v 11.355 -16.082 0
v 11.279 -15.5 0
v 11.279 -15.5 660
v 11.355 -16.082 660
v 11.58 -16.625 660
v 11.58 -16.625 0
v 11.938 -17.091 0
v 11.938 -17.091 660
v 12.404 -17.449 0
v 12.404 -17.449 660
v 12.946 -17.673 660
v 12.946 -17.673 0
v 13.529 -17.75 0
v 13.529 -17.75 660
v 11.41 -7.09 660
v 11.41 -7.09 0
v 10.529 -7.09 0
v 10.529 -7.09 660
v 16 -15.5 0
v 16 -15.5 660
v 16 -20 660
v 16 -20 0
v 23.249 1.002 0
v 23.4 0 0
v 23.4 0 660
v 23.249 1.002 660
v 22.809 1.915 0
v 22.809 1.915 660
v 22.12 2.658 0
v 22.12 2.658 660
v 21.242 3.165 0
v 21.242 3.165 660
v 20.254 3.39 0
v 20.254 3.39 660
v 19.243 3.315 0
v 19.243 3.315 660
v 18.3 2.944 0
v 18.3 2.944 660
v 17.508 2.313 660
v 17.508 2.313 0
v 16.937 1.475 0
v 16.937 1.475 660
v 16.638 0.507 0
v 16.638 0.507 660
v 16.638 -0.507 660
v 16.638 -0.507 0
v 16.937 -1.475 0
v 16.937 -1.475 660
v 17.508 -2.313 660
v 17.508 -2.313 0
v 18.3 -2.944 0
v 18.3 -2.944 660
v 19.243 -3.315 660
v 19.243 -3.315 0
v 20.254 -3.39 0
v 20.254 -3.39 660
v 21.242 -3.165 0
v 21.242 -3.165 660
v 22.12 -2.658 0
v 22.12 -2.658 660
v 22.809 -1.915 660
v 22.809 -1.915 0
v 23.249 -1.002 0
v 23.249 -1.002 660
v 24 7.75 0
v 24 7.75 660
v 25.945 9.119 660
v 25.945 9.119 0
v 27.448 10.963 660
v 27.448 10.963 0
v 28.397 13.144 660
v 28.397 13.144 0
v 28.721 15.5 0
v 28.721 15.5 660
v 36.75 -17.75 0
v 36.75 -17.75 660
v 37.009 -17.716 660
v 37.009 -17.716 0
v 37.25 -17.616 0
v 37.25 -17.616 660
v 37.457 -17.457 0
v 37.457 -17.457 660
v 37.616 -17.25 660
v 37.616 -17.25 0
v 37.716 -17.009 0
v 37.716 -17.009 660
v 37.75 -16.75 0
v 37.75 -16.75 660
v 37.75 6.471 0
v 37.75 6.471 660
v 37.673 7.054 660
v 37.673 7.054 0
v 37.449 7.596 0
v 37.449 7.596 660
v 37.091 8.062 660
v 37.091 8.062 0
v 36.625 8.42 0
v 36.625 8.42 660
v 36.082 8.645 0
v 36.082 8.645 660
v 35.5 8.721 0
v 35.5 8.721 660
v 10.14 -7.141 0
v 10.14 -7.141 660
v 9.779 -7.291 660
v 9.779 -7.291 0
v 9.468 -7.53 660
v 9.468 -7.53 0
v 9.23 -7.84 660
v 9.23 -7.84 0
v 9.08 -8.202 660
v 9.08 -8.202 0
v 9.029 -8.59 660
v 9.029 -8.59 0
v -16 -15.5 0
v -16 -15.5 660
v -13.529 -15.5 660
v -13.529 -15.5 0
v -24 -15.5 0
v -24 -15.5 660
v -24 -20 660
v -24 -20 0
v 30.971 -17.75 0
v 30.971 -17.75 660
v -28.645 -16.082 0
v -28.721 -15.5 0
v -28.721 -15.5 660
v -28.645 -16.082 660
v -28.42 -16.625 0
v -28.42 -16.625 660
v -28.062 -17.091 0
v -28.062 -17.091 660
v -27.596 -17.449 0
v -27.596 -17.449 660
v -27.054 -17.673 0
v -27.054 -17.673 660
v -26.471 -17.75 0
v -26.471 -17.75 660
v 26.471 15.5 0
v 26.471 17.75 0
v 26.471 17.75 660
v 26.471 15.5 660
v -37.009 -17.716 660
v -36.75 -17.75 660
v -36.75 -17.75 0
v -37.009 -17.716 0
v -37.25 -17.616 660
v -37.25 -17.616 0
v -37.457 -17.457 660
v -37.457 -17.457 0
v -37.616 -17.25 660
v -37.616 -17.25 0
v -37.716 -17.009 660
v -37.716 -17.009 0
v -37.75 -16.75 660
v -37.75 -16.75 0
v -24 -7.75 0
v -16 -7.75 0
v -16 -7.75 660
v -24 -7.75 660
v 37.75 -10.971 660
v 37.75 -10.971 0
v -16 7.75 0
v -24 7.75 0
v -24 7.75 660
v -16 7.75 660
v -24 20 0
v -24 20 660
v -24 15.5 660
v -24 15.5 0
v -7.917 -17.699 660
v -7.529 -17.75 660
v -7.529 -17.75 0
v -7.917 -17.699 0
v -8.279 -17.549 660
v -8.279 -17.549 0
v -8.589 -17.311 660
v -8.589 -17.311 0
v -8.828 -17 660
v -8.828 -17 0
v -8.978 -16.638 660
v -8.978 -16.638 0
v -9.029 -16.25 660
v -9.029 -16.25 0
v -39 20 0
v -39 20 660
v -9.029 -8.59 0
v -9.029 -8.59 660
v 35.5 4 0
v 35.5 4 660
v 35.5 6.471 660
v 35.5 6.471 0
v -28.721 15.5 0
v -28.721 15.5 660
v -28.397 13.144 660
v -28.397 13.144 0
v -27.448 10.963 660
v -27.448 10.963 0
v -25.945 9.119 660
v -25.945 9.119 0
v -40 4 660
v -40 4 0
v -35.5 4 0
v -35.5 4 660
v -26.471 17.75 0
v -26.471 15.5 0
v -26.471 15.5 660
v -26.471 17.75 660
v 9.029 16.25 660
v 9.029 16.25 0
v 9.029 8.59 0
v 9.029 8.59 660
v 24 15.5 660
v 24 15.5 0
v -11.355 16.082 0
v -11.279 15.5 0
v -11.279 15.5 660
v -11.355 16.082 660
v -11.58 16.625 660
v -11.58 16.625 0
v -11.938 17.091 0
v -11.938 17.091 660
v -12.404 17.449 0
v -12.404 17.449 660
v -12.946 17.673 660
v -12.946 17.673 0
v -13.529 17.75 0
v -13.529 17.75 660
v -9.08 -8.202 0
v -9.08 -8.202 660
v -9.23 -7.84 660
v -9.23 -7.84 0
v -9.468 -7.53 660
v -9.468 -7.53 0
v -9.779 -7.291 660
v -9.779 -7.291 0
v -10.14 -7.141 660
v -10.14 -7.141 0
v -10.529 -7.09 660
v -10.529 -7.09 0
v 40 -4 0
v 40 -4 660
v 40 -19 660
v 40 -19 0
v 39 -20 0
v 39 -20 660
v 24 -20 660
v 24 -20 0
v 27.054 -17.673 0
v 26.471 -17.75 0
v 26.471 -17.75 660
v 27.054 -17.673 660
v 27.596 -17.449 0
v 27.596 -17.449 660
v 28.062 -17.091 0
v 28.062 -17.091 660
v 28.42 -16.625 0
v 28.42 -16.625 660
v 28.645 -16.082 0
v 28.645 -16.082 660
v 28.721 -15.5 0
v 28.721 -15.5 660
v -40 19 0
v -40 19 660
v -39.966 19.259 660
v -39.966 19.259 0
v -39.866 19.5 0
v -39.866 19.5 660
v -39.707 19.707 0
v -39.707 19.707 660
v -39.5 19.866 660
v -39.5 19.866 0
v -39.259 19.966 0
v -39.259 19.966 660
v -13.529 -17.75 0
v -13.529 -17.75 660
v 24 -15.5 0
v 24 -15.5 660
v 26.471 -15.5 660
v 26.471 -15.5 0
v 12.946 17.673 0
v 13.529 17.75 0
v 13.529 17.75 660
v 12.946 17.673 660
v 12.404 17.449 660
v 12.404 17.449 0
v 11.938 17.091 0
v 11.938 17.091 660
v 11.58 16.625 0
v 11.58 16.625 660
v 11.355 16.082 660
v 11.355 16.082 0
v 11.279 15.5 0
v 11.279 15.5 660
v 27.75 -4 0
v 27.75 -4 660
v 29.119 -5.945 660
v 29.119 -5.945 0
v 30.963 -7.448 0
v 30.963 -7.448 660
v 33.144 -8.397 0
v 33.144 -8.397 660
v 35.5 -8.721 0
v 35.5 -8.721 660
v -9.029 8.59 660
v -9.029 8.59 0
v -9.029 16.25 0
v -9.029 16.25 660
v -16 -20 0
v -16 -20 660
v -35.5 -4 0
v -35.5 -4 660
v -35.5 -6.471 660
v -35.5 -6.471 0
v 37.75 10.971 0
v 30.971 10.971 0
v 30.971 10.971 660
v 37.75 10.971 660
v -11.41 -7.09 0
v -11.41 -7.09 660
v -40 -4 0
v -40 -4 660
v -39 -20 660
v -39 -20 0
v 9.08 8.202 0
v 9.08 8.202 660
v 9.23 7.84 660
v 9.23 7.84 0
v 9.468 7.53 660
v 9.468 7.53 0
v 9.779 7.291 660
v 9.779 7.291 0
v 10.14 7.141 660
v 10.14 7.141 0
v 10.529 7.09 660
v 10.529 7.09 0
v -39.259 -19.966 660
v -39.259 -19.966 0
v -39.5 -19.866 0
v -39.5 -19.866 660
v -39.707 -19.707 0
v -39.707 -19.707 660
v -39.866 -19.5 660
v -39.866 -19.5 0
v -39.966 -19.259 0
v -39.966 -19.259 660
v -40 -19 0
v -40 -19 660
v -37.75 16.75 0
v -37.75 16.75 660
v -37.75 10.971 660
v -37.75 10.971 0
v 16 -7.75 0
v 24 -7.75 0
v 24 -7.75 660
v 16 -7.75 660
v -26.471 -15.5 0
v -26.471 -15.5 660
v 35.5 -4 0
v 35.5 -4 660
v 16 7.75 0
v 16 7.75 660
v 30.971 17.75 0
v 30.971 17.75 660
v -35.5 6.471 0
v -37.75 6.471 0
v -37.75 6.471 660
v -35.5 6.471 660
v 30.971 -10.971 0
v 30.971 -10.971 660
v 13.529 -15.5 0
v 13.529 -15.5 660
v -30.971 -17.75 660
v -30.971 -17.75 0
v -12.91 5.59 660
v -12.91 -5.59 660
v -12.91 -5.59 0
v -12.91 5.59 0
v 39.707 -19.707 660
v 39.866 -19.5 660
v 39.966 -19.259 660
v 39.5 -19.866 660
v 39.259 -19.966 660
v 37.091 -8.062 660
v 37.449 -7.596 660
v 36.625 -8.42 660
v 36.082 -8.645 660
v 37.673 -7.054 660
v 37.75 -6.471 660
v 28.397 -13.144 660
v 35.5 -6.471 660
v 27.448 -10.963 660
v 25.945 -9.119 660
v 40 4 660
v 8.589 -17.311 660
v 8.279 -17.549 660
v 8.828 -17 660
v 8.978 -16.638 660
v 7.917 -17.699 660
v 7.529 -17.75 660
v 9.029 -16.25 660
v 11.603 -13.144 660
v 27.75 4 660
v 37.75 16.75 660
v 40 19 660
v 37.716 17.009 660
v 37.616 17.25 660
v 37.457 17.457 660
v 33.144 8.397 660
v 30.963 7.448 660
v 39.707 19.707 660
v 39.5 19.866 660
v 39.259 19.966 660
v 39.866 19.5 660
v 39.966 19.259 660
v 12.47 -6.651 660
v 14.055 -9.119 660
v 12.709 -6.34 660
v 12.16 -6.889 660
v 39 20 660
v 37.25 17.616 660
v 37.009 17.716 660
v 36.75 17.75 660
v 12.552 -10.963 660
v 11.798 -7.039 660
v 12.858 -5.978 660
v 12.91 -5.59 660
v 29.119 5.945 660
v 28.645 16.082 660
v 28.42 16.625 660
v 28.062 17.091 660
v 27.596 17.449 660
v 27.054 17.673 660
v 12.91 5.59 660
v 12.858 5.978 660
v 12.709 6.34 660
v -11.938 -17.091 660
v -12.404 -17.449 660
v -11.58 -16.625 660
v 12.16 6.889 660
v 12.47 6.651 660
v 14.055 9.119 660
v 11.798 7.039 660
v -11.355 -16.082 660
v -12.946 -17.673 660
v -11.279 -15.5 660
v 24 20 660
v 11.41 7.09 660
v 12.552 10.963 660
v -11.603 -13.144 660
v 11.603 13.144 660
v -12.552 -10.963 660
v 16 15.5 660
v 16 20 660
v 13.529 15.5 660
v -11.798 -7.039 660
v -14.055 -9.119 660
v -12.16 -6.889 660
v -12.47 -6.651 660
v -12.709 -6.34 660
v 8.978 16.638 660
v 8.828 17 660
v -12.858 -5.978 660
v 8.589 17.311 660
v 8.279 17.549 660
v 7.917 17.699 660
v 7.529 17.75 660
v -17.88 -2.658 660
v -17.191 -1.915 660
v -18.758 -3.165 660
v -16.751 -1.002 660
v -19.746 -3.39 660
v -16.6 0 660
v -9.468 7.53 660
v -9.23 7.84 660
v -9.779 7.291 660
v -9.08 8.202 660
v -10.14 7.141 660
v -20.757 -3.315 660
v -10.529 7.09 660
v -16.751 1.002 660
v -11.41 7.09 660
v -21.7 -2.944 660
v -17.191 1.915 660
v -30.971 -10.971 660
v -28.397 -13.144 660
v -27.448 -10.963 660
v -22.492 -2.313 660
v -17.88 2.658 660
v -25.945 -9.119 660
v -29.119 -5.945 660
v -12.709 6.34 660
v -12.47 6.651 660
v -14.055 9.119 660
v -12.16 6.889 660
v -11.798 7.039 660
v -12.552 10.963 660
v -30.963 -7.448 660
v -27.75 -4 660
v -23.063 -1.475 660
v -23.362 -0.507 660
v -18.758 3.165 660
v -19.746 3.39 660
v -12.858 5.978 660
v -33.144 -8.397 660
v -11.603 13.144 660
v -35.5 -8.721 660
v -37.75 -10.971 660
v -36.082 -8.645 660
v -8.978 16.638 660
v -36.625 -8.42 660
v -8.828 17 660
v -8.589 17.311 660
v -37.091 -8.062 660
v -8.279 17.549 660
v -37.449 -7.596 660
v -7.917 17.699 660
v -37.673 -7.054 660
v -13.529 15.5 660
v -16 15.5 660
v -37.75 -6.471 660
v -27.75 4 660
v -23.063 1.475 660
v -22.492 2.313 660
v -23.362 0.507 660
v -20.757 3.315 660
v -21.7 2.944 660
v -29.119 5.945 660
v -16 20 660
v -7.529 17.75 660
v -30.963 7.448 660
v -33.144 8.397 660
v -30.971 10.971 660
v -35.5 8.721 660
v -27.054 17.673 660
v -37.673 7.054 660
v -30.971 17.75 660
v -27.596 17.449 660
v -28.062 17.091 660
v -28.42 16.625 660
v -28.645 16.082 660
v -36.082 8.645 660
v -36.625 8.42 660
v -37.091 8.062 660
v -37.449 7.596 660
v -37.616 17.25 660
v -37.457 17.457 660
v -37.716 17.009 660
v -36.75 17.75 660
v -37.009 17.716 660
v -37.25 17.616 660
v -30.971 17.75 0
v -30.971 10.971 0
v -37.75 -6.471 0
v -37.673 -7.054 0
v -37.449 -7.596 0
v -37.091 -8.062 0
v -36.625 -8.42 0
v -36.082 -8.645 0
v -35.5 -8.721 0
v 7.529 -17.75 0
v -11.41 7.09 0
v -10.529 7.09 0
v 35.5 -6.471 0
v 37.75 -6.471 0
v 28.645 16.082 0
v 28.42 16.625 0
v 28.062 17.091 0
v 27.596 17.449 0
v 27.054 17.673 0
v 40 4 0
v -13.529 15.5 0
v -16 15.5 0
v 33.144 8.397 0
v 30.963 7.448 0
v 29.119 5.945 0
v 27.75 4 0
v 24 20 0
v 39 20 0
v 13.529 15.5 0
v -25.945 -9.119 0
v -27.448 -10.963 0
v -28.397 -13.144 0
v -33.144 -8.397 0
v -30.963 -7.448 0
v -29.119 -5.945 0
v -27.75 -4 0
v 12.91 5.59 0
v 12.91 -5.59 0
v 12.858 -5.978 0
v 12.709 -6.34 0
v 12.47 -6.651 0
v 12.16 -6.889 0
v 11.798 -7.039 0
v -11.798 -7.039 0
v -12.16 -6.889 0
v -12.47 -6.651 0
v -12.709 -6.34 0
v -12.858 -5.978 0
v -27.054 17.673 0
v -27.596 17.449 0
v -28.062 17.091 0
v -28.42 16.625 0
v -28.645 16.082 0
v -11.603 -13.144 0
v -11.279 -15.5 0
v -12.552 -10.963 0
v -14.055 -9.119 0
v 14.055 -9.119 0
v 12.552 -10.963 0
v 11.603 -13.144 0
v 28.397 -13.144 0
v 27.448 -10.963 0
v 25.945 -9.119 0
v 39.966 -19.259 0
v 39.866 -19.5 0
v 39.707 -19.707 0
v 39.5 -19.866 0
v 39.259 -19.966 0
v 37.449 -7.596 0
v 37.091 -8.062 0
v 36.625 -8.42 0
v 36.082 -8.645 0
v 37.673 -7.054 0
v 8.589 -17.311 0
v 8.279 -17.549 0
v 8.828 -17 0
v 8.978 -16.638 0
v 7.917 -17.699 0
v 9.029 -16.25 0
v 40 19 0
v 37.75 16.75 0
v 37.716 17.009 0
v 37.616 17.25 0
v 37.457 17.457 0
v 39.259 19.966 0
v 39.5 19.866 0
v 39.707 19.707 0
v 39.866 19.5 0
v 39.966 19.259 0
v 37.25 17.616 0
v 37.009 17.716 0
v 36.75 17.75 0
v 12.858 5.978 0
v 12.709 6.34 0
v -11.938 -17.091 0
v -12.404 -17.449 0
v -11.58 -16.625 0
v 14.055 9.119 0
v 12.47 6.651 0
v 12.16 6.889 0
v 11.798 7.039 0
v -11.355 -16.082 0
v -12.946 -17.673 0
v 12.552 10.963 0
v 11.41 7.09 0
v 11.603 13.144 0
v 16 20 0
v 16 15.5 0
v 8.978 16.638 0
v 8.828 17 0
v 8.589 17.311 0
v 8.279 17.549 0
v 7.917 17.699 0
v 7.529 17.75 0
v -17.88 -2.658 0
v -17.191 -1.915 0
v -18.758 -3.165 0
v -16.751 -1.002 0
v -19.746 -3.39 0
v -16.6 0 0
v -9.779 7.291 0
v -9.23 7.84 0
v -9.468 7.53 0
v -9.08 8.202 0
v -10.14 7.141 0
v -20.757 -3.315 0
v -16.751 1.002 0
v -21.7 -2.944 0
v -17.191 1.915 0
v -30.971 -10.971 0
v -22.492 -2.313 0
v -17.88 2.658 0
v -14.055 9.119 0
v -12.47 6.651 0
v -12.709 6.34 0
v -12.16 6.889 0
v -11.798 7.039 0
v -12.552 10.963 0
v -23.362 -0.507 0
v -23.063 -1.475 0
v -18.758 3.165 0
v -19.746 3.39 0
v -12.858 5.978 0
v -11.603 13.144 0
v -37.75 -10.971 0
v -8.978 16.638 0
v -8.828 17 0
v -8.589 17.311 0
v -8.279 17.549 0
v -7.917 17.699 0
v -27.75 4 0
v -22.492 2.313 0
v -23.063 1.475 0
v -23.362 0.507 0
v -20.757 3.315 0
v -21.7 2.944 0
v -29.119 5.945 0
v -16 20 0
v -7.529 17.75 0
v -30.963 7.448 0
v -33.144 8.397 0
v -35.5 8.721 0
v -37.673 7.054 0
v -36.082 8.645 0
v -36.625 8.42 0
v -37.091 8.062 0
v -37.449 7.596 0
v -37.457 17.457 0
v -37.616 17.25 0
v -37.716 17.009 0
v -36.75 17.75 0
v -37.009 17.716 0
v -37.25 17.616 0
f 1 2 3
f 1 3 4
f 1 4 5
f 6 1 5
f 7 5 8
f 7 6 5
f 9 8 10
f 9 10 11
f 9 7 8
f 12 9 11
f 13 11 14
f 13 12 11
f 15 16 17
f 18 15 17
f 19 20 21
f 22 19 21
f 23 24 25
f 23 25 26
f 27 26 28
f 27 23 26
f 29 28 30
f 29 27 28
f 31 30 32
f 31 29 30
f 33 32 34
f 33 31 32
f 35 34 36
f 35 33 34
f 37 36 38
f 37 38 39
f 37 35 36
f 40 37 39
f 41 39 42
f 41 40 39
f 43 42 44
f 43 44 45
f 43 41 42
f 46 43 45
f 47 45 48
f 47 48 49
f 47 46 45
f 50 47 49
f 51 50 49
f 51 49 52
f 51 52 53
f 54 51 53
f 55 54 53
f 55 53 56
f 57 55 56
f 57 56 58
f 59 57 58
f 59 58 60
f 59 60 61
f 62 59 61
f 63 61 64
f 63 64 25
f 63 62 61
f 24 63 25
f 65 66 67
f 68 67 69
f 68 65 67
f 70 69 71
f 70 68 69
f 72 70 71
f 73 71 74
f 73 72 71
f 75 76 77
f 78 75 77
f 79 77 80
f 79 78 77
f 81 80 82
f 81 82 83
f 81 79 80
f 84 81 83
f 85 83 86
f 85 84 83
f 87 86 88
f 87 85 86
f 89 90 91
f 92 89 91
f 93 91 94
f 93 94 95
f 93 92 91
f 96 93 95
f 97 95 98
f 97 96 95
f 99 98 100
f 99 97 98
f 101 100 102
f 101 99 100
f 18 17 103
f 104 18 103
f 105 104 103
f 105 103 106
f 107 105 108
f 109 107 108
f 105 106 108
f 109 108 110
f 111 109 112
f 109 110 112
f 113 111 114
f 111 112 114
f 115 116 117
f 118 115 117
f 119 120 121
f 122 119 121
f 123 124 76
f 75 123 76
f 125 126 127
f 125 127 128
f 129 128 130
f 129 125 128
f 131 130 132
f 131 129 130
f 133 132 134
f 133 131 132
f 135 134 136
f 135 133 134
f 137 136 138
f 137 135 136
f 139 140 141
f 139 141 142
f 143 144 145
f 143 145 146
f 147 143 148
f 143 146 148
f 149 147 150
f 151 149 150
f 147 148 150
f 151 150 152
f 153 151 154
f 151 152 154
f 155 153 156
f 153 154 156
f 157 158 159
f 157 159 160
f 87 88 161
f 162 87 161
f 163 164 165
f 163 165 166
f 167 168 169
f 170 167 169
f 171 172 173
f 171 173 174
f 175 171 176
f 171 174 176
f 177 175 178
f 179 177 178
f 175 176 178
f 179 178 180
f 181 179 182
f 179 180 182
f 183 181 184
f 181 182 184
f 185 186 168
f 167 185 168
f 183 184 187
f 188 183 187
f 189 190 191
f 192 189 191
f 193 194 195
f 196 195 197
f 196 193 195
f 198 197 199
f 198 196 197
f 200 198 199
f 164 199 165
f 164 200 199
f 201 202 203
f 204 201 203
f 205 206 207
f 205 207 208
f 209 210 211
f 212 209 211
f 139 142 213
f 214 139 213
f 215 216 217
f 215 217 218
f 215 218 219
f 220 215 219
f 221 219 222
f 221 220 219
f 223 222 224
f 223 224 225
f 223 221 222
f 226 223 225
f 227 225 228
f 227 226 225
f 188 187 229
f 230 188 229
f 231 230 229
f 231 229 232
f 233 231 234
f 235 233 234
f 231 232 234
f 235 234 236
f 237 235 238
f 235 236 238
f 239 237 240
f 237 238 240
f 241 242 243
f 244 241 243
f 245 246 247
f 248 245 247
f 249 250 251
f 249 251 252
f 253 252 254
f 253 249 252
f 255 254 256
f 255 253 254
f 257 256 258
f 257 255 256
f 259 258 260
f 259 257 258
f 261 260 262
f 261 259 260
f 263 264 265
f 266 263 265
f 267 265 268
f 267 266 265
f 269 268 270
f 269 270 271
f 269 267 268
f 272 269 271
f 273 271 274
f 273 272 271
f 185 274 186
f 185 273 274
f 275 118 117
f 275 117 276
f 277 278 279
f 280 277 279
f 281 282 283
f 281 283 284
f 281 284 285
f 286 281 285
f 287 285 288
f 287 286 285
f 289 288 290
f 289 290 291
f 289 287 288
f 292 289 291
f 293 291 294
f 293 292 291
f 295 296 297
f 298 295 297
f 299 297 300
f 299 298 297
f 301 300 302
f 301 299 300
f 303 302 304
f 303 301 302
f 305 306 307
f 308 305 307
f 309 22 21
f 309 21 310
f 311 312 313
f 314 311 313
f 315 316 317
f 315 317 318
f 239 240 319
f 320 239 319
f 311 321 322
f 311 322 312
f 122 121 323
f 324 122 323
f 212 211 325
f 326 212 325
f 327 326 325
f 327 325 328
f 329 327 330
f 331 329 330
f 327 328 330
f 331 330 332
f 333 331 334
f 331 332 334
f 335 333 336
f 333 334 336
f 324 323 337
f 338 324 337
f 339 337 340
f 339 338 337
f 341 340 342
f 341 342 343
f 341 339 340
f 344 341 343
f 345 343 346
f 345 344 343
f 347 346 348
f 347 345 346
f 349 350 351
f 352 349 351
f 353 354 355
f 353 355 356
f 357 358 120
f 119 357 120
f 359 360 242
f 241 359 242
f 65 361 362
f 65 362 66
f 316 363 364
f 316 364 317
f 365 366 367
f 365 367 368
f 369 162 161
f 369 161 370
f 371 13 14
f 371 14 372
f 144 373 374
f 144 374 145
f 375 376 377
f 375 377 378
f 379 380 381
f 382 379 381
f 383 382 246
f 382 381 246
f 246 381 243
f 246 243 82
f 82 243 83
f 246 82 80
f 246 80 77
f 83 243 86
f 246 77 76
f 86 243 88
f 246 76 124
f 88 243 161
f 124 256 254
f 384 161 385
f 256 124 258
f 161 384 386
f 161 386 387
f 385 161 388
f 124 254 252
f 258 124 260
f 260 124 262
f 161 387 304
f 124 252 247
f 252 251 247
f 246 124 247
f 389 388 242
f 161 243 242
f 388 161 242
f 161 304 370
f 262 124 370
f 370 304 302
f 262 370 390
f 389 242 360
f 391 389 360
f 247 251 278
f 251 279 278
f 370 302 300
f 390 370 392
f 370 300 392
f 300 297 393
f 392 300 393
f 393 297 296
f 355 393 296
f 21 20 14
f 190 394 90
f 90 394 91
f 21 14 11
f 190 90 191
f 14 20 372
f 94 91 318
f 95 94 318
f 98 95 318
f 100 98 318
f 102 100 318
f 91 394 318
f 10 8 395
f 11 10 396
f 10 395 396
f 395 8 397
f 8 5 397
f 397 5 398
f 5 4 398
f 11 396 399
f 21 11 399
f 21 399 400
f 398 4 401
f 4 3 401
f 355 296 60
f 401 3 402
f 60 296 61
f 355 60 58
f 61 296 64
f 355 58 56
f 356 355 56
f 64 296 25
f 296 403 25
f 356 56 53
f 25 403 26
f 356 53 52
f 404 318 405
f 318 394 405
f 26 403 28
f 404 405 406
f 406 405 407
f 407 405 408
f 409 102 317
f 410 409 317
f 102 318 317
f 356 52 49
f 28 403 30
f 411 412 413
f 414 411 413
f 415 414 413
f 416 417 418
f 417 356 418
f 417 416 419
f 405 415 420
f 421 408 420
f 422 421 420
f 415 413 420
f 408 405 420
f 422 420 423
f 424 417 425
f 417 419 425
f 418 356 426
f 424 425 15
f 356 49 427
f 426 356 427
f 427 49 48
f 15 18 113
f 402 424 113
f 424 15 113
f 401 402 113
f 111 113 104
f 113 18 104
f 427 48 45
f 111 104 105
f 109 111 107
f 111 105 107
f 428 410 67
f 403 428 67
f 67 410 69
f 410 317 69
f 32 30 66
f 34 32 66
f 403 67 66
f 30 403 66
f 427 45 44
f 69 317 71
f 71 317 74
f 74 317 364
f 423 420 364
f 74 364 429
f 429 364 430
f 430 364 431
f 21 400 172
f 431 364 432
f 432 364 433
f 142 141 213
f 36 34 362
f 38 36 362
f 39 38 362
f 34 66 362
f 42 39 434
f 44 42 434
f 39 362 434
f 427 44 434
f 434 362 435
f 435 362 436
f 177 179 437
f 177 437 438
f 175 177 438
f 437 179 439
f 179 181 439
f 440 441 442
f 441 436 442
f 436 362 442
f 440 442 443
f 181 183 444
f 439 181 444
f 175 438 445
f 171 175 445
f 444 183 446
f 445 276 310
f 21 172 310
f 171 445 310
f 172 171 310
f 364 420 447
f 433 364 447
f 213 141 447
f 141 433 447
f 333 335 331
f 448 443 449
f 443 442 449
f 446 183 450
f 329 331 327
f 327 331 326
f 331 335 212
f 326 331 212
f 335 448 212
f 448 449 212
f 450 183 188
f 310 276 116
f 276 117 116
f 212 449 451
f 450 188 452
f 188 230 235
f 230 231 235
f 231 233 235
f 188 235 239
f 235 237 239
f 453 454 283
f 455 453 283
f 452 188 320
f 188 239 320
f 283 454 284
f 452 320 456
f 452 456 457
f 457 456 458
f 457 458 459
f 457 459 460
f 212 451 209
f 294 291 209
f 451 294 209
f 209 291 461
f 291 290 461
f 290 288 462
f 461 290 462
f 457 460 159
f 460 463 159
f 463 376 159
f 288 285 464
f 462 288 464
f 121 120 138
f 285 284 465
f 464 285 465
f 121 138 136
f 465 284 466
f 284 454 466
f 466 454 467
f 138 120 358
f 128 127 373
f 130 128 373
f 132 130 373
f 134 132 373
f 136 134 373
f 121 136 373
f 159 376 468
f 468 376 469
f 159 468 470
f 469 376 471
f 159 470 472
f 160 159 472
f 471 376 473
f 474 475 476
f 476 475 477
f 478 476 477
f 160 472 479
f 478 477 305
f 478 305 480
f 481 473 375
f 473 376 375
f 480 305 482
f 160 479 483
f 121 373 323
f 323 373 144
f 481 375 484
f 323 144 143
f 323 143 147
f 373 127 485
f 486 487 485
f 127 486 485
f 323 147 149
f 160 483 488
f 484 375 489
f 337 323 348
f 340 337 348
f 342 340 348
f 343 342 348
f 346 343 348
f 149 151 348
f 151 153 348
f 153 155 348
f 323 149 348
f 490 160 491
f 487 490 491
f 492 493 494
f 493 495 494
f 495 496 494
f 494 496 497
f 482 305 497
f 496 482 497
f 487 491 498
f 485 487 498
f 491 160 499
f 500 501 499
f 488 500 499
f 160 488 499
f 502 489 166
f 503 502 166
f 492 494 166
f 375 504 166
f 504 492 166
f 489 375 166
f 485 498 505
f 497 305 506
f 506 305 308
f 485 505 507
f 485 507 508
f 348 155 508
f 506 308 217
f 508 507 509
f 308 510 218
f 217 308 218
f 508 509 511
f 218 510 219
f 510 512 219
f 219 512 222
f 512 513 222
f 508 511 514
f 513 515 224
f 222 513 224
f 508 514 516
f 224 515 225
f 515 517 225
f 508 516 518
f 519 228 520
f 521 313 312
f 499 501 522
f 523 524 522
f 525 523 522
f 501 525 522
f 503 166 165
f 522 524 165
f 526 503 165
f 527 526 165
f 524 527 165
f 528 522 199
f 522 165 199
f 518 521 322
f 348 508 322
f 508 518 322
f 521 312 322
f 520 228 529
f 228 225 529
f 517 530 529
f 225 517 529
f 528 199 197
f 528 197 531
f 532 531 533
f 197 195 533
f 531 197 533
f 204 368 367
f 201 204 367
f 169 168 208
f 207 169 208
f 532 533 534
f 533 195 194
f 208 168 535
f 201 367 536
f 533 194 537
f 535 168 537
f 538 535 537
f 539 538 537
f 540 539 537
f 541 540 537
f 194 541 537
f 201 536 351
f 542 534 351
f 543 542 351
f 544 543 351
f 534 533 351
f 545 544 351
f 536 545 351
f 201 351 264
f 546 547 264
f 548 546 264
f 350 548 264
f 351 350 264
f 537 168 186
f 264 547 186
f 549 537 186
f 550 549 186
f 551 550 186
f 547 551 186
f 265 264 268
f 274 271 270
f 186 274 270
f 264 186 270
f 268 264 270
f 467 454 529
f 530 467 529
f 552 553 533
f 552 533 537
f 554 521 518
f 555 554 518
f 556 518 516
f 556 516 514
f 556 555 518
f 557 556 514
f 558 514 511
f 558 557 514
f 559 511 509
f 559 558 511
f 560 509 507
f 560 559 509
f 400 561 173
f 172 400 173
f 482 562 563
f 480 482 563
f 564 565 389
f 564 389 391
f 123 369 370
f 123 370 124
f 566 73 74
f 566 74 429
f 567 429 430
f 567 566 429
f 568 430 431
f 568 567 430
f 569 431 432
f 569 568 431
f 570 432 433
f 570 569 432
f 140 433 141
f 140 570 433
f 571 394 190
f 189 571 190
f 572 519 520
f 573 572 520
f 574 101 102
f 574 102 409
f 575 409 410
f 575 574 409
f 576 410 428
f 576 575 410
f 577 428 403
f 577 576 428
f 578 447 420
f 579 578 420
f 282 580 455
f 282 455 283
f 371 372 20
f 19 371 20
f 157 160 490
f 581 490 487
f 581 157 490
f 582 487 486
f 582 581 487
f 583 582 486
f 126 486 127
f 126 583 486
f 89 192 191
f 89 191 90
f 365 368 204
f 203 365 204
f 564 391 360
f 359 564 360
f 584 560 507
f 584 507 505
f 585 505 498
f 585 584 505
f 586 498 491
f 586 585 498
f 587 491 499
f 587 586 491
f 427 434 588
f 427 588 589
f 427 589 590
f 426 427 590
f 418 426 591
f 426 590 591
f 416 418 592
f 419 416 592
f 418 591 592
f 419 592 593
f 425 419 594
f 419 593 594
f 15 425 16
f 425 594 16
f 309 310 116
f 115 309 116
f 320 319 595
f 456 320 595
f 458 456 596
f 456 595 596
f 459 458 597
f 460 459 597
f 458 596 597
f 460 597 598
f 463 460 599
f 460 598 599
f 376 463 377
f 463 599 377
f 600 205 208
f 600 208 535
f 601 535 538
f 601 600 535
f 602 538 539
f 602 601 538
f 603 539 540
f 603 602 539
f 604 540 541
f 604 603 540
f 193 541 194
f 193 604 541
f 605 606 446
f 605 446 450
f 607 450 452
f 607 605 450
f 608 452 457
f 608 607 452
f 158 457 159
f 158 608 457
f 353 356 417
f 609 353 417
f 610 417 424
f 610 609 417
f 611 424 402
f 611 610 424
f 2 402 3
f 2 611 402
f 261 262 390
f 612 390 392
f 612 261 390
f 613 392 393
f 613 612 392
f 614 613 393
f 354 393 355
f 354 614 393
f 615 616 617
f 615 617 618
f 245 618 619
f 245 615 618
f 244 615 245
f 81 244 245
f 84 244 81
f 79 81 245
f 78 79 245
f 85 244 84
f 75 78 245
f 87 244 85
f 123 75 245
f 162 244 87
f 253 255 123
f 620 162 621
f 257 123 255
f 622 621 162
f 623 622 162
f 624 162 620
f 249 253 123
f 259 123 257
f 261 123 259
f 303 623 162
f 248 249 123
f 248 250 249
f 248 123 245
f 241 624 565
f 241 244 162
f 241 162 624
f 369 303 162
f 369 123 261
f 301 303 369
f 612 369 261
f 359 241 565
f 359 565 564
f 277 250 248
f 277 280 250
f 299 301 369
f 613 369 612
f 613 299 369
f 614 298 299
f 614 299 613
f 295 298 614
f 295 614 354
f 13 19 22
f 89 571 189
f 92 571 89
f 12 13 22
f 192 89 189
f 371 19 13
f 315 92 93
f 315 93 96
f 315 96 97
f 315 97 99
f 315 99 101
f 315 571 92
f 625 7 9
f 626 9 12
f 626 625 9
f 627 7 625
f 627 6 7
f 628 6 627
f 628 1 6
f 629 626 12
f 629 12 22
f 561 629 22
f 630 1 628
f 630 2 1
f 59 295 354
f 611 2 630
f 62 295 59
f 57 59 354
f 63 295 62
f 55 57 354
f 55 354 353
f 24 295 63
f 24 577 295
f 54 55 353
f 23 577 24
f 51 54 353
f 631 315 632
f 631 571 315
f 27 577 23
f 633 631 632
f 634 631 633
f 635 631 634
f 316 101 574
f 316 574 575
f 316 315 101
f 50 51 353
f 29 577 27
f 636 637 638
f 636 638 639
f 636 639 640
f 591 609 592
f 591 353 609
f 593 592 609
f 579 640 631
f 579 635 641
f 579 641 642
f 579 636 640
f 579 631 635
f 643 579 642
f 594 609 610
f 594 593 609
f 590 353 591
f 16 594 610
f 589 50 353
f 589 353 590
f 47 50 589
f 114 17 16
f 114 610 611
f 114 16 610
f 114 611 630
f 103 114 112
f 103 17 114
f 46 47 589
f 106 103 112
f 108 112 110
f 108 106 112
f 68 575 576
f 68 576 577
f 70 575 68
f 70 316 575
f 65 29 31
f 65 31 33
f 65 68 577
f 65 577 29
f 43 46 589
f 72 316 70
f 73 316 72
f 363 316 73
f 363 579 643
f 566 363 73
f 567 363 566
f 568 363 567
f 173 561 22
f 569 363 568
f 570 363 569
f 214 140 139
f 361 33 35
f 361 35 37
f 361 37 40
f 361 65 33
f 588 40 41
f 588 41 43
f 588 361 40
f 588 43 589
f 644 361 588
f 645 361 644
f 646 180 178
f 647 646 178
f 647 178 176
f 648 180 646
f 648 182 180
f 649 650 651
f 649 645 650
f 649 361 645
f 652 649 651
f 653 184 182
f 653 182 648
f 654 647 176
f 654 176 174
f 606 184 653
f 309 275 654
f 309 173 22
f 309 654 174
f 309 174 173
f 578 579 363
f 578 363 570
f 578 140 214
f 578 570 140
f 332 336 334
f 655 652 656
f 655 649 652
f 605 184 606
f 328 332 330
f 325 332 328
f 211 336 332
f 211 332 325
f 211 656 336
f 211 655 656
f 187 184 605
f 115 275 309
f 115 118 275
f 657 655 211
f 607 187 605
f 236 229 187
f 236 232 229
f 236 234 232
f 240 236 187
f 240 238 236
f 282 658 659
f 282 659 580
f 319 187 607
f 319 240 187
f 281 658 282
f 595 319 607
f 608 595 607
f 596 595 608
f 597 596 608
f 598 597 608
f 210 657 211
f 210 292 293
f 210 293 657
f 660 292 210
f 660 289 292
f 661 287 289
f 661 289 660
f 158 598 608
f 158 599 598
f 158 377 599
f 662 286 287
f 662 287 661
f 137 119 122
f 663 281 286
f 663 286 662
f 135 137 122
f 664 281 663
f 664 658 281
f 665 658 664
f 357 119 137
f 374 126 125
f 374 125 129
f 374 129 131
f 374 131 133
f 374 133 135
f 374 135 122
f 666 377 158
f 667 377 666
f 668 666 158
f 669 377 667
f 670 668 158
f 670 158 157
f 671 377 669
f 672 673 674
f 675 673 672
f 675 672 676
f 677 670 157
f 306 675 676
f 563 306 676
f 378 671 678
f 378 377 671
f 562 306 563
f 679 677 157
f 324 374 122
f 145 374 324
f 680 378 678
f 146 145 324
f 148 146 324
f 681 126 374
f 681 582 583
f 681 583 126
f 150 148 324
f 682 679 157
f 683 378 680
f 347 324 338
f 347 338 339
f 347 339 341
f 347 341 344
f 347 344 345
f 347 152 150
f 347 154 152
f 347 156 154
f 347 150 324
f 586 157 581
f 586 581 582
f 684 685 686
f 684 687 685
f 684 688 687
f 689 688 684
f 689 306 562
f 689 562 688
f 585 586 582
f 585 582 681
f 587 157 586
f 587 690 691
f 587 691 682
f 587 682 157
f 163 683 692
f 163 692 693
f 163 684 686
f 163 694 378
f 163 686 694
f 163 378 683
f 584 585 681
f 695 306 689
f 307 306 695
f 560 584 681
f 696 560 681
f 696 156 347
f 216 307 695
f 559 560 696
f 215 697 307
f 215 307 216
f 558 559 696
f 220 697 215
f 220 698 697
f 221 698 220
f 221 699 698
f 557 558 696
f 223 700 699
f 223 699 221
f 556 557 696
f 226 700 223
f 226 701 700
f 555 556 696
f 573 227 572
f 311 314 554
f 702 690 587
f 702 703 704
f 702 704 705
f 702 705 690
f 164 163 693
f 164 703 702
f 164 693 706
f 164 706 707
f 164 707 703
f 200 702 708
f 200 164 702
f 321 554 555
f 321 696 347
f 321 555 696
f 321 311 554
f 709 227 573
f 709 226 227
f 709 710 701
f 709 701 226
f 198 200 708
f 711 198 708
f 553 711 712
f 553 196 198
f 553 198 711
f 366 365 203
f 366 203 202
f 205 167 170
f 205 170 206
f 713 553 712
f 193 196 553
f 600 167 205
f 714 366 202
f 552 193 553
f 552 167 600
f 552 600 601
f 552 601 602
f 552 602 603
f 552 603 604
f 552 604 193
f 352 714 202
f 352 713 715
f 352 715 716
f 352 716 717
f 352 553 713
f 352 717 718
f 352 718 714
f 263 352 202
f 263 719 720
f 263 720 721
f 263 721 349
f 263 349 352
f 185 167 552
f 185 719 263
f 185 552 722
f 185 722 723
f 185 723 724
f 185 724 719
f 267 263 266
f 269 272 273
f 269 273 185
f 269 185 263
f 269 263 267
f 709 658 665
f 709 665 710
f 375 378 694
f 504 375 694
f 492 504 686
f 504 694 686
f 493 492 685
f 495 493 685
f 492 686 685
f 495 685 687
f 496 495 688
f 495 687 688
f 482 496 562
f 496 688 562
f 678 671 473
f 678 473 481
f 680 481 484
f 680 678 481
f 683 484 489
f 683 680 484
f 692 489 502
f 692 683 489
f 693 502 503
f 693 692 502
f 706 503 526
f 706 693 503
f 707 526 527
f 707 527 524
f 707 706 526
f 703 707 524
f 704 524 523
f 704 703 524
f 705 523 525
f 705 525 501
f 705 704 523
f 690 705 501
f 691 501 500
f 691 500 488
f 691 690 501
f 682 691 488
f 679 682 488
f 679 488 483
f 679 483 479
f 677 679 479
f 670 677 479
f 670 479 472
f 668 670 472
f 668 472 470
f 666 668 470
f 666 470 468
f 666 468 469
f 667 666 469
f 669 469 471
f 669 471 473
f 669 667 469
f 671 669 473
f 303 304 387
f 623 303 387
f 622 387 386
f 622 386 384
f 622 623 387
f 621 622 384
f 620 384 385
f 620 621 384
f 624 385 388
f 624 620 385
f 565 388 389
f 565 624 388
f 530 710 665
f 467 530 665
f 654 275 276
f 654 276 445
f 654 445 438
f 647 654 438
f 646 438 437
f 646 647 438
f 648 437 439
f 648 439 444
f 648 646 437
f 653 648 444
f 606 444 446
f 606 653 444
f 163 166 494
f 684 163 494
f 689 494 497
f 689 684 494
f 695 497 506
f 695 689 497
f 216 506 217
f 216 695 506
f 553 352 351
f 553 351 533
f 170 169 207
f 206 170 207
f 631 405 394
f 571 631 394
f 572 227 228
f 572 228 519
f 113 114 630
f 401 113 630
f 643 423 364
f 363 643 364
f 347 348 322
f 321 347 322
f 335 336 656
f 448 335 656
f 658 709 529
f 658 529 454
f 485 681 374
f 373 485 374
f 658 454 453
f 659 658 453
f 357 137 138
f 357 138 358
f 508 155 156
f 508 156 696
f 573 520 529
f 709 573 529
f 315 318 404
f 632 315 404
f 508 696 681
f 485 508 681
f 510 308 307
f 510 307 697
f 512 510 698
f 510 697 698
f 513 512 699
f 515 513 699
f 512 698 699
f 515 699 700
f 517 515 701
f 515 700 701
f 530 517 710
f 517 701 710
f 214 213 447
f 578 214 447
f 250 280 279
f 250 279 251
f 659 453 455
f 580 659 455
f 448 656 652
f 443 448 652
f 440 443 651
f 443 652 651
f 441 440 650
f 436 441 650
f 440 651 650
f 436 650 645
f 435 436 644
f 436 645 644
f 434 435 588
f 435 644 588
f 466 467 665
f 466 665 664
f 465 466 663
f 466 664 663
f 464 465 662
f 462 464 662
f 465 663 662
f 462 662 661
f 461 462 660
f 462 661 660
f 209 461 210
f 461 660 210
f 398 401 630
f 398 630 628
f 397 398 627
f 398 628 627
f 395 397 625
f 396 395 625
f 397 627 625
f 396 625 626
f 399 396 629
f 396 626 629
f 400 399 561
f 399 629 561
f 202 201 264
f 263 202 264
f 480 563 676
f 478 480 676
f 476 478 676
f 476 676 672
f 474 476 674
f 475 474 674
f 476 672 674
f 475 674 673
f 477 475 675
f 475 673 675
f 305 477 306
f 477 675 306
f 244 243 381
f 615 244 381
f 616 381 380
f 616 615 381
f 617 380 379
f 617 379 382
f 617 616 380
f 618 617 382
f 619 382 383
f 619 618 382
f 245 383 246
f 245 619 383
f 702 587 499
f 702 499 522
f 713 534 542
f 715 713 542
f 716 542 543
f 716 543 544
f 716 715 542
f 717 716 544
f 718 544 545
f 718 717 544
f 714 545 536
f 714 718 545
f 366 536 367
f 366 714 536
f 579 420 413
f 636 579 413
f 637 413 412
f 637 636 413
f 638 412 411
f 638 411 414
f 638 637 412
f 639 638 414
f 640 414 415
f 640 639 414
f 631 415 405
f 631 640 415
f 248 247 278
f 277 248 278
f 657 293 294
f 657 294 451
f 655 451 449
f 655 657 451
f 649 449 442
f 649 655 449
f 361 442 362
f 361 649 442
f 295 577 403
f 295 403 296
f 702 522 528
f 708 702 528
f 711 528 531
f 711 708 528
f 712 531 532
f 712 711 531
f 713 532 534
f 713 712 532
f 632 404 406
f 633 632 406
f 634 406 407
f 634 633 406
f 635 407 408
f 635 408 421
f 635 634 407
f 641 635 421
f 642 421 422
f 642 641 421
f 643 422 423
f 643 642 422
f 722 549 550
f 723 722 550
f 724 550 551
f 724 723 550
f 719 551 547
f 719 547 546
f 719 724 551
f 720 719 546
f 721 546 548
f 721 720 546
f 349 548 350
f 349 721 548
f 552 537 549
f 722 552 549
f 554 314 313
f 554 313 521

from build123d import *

# Parameters (mm, degrees)
SZKIC1_R                    = 3.4
DODANIE_WYCI_GNI_CIE1_DEPTH = 660
SZKIC2_W                    = 2.25
SZKIC2_H                    = 8
WYTNIJ_WYCI_GNI_CIE1_DEPTH  = 662.513416342


with BuildPart() as part:
    # Szkic1 → Dodanie-wyciągnięcie1 (new body)
    with BuildSketch(Plane.XY):
        with BuildLine():
            Line((-40, -19), (-40, 19))
            ThreePointArc((-40, 19), (-39.707106781, 19.707106781), (-39, 20))
            Line((-39, 20), (-24, 20))
            Line((-24, 20), (-24, 15.5))
            Line((-24, 15.5), (-26.471381771, 15.5))
            Line((-26.471381771, 15.5), (-26.471381771, 17.75))
            ThreePointArc((-26.471381771, 17.75), (-28.062372029, 17.090990258), (-28.721381771, 15.5))
            ThreePointArc((-28.721381771, 15.5), (-27.448087912, 10.962546258), (-24, 7.75))
            Line((-24, 7.75), (-16, 7.75))
            ThreePointArc((-16, 7.75), (-12.551912088, 10.962546258), (-11.278618229, 15.5))
            ThreePointArc((-11.278618229, 15.5), (-11.937627971, 17.090990258), (-13.528618229, 17.75))
            Line((-13.528618229, 17.75), (-13.528618229, 15.5))
            Line((-13.528618229, 15.5), (-16, 15.5))
            Line((-16, 15.5), (-16, 20))
            Line((-16, 20), (13.528618229, 20))
            Line((13.528618229, 20), (16, 20))
            Line((16, 20), (16, 15.5))
            Line((16, 15.5), (13.528618229, 15.5))
            Line((13.528618229, 15.5), (13.528618229, 17.75))
            ThreePointArc((13.528618229, 17.75), (11.937627971, 17.090990258), (11.278618229, 15.5))
            ThreePointArc((11.278618229, 15.5), (12.551912088, 10.962546258), (16, 7.75))
            Line((16, 7.75), (24, 7.75))
            ThreePointArc((24, 7.75), (27.448087912, 10.962546258), (28.721381771, 15.5))
            ThreePointArc((28.721381771, 15.5), (28.062372029, 17.090990258), (26.471381771, 17.75))
            Line((26.471381771, 17.75), (26.471381771, 15.5))
            Line((26.471381771, 15.5), (24, 15.5))
            Line((24, 15.5), (24, 20))
            Line((24, 20), (39, 20))
            ThreePointArc((39, 20), (39.707106781, 19.707106781), (40, 19))
            Line((40, 19), (40, 4))
            Line((40, 4), (35.5, 4))
            Line((35.5, 4), (35.5, 6.471381771))
            Line((35.5, 6.471381771), (37.75, 6.471381771))
            ThreePointArc((37.75, 6.471381771), (37.090990258, 8.062372029), (35.5, 8.721381771))
            ThreePointArc((35.5, 8.721381771), (30.962546258, 7.448087912), (27.75, 4))
            Line((27.75, 4), (27.75, -4))
            ThreePointArc((27.75, -4), (30.962546258, -7.448087912), (35.5, -8.721381771))
            ThreePointArc((35.5, -8.721381771), (37.090990258, -8.062372029), (37.75, -6.471381771))
            Line((37.75, -6.471381771), (35.5, -6.471381771))
            Line((35.5, -6.471381771), (35.5, -4))
            Line((35.5, -4), (40, -4))
            Line((40, -4), (40, -19))
            ThreePointArc((40, -19), (39.707106781, -19.707106781), (39, -20))
            Line((39, -20), (24, -20))
            Line((24, -20), (24, -15.5))
            Line((24, -15.5), (26.471381771, -15.5))
            Line((26.471381771, -15.5), (26.471381771, -17.75))
            ThreePointArc((26.471381771, -17.75), (28.062372029, -17.090990258), (28.721381771, -15.5))
            ThreePointArc((28.721381771, -15.5), (27.448087912, -10.962546258), (24, -7.75))
            Line((24, -7.75), (16, -7.75))
            ThreePointArc((16, -7.75), (12.551912088, -10.962546258), (11.278618229, -15.5))
            ThreePointArc((11.278618229, -15.5), (11.937627971, -17.090990258), (13.528618229, -17.75))
            Line((13.528618229, -17.75), (13.528618229, -15.5))
            Line((13.528618229, -15.5), (16, -15.5))
            Line((16, -15.5), (16, -20))
            Line((16, -20), (-16, -20))
            Line((-16, -20), (-16, -15.5))
            Line((-16, -15.5), (-13.528618229, -15.5))
            Line((-13.528618229, -15.5), (-13.528618229, -17.75))
            ThreePointArc((-13.528618229, -17.75), (-11.937627971, -17.090990258), (-11.278618229, -15.5))
            ThreePointArc((-11.278618229, -15.5), (-12.551912088, -10.962546258), (-16, -7.75))
            Line((-16, -7.75), (-24, -7.75))
            ThreePointArc((-24, -7.75), (-27.448087912, -10.962546258), (-28.721381771, -15.5))
            ThreePointArc((-28.721381771, -15.5), (-28.062372029, -17.090990258), (-26.471381771, -17.75))
            Line((-26.471381771, -17.75), (-26.471381771, -15.5))
            Line((-26.471381771, -15.5), (-24, -15.5))
            Line((-24, -15.5), (-24, -20))
            Line((-24, -20), (-39, -20))
            ThreePointArc((-39, -20), (-39.707106781, -19.707106781), (-40, -19))
        make_face()
        with Locations((-20, 0)):
            Circle(SZKIC1_R, mode=Mode.SUBTRACT)
        with Locations((20, 0)):
            Circle(SZKIC1_R, mode=Mode.SUBTRACT)
        with BuildLine():
            Line((30.971381771, -17.75), (36.75, -17.75))
            ThreePointArc((36.75, -17.75), (37.457106781, -17.457106781), (37.75, -16.75))
            Line((37.75, -16.75), (37.75, -10.971381771))
            Line((37.75, -10.971381771), (30.971381771, -10.971381771))
            Line((30.971381771, -10.971381771), (30.971381771, -17.75))
        make_face(mode=Mode.SUBTRACT)
        with BuildLine():
            Line((-35.5, -6.471381771), (-37.75, -6.471381771))
            ThreePointArc((-37.75, -6.471381771), (-37.090990258, -8.062372029), (-35.5, -8.721381771))
            ThreePointArc((-35.5, -8.721381771), (-30.962546258, -7.448087912), (-27.75, -4))
            Line((-27.75, -4), (-27.75, 4))
            ThreePointArc((-27.75, 4), (-30.962546258, 7.448087912), (-35.5, 8.721381771))
            ThreePointArc((-35.5, 8.721381771), (-37.090990258, 8.062372029), (-37.75, 6.471381771))
            Line((-37.75, 6.471381771), (-35.5, 6.471381771))
            Line((-35.5, 6.471381771), (-35.5, 4))
            Line((-35.5, 4), (-37.75, 4))
            Line((-37.75, 4), (-37.75, -4))
            Line((-37.75, -4), (-35.5, -4))
            Line((-35.5, -4), (-35.5, -6.471381771))
        make_face(mode=Mode.SUBTRACT)
        with BuildLine():
            Line((10.528618229, 7.090188806), (11.40950808, 7.090188806))
            ThreePointArc((11.40950808, 7.090188806), (12.470168251, 6.650848977), (12.90950808, 5.590188806))
            Line((12.90950808, 5.590188806), (12.90950808, -5.590188806))
            ThreePointArc((12.90950808, -5.590188806), (12.470168251, -6.650848977), (11.40950808, -7.090188806))
            Line((11.40950808, -7.090188806), (10.528618229, -7.090188806))
            ThreePointArc((10.528618229, -7.090188806), (9.467958057, -7.529528634), (9.028618229, -8.590188806))
            Line((9.028618229, -8.590188806), (9.028618229, -16.25))
            ThreePointArc((9.028618229, -16.25), (8.589278401, -17.310660172), (7.528618229, -17.75))
            Line((7.528618229, -17.75), (-7.528618229, -17.75))
            ThreePointArc((-7.528618229, -17.75), (-8.589278401, -17.310660172), (-9.028618229, -16.25))
            Line((-9.028618229, -16.25), (-9.028618229, -8.590188806))
            ThreePointArc((-9.028618229, -8.590188806), (-9.467958057, -7.529528634), (-10.528618229, -7.090188806))
            Line((-10.528618229, -7.090188806), (-11.40950808, -7.090188806))
            ThreePointArc((-11.40950808, -7.090188806), (-12.470168251, -6.650848977), (-12.90950808, -5.590188806))
            Line((-12.90950808, -5.590188806), (-12.90950808, 5.590188806))
            ThreePointArc((-12.90950808, 5.590188806), (-12.470168251, 6.650848977), (-11.40950808, 7.090188806))
            Line((-11.40950808, 7.090188806), (-10.528618229, 7.090188806))
            ThreePointArc((-10.528618229, 7.090188806), (-9.467958057, 7.529528634), (-9.028618229, 8.590188806))
            Line((-9.028618229, 8.590188806), (-9.028618229, 16.25))
            ThreePointArc((-9.028618229, 16.25), (-8.589278401, 17.310660172), (-7.528618229, 17.75))
            Line((-7.528618229, 17.75), (7.528618229, 17.75))
            ThreePointArc((7.528618229, 17.75), (8.589278401, 17.310660172), (9.028618229, 16.25))
            Line((9.028618229, 16.25), (9.028618229, 8.590188806))
            ThreePointArc((9.028618229, 8.590188806), (9.467958057, 7.529528634), (10.528618229, 7.090188806))
        make_face(mode=Mode.SUBTRACT)
        with BuildLine():
            Line((30.971381771, 10.971381771), (37.75, 10.971381771))
            Line((37.75, 10.971381771), (37.75, 16.75))
            ThreePointArc((37.75, 16.75), (37.457106781, 17.457106781), (36.75, 17.75))
            Line((36.75, 17.75), (30.971381771, 17.75))
            Line((30.971381771, 17.75), (30.971381771, 10.971381771))
        make_face(mode=Mode.SUBTRACT)
        with BuildLine():
            Line((-30.971381771, -10.971381771), (-30.971381771, -17.75))
            Line((-30.971381771, -17.75), (-36.75, -17.75))
            ThreePointArc((-36.75, -17.75), (-37.457106781, -17.457106781), (-37.75, -16.75))
            Line((-37.75, -16.75), (-37.75, -10.971381771))
            Line((-37.75, -10.971381771), (-30.971381771, -10.971381771))
        make_face(mode=Mode.SUBTRACT)
        with BuildLine():
            Line((-30.971381771, 17.75), (-36.75, 17.75))
            ThreePointArc((-36.75, 17.75), (-37.457106781, 17.457106781), (-37.75, 16.75))
            Line((-37.75, 16.75), (-37.75, 10.971381771))
            Line((-37.75, 10.971381771), (-30.971381771, 10.971381771))
            Line((-30.971381771, 10.971381771), (-30.971381771, 17.75))
        make_face(mode=Mode.SUBTRACT)
    extrude(amount=DODANIE_WYCI_GNI_CIE1_DEPTH)

    # Szkic2 → Wytnij-wyciągnięcie1 (cut, through all)
    with BuildSketch(Plane.XY.offset(660)):
        with Locations((-38.875, 0)):
            Rectangle(SZKIC2_W, SZKIC2_H)
    extrude(amount=-WYTNIJ_WYCI_GNI_CIE1_DEPTH, mode=Mode.SUBTRACT)


solid = part.part
